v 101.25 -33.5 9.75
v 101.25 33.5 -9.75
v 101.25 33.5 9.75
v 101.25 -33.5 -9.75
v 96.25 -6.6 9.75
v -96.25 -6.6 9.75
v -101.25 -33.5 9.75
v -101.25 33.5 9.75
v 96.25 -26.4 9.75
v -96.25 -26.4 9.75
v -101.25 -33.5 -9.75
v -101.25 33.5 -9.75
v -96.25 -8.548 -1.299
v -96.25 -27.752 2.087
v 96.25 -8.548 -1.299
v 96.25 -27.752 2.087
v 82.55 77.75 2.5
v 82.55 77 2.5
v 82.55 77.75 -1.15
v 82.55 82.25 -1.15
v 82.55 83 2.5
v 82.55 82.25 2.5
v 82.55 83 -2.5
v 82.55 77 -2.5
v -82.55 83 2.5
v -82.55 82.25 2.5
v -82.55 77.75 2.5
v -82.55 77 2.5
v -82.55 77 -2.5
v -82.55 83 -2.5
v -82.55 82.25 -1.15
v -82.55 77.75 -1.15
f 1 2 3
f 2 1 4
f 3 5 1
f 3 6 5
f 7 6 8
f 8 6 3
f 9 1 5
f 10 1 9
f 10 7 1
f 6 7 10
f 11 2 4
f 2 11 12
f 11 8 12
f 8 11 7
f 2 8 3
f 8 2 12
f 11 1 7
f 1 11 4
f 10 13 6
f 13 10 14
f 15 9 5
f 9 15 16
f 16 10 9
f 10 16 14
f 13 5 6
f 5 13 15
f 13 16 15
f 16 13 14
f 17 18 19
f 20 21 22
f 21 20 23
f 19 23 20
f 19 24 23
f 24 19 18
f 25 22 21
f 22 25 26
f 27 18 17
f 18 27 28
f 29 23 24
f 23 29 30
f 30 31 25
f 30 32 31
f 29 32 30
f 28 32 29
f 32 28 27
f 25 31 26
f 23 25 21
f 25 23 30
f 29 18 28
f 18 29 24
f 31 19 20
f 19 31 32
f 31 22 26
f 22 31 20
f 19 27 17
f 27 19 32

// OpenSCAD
// file: myTools.scad
module tube (r = 0, d = 0, l = 0, 
            thick = 0, 
            bCentered = true, 
            taper_pct = 0, 
            circlip = false) // r=radius d=dia l=length 
{
    assert( r != 0 || d != 0, "specify one of radius or diameter");
    assert( l != 0 , "tube: need length 'l' to be non zero");
    assert( thick != 0, "wall thickness cannot be zero");

    punch = $preview ? .2 : 0; // stop funny view artifact

    dia = r ? r * 2 : d;

    od = ((thick > 0) ? dia + thick * 2 : dia);
    id = (thick > 0) ? dia             : dia  + thick *2; 

    
    
    if (thick > 0)
        echo ("tube\tMIN id = ", id, "od = ", od, "wall = ", thick, "center= ", bCentered);
    else
        echo ("tube\tMAX od = ", od, "id = ", id, "wall = ", thick, "center= ", bCentered);

    echo ("tube\tHeigth = ", l);
        
    if (taper_pct != 0)
    {
        echo ("tube\t*** OD expanded by ", taper_pct, "%, : bottom od = ", od * (1. +taper_pct/100), "top od = ", od);
    }
    
    assert(dia || dia < 0, "tube : missing r or d ");
    
    // if taper_pct specified, the base will always be closest to 0,0,0
    translate([ 0, 0, taper_pct == 0 ? 0: bCentered ? l/2:l  ])
    rotate([0, taper_pct == 0 ? 0 : 180, 0 ])

    difference()
    {
        // make a reese's cup
        {
            color("YELLOW", .3)
            linear_extrude(height= l, scale = 1 + taper_pct/100)
                difference()
                {
                    circle(d = od);
                    circle(d = .5);
                }
        }
    
     // hollow out reessed cup
     color("GREEN")
     translate([0, 0, -punch/2])
     linear_extrude(height= l+ punch*2, $fn=100)
     {
        circle(d = id);
        if (circlip) #square([1 + punch, od ]);
     }
    
    }
}
//==============================================================================
        
module abox (dims, 
            thick = 0, 
            bCentered = true, 
            round_out = 0, 
            round_in = 0, 
            bSolid = false,
            bHollow = false,
            elevator = 0)   // move bottom up by X
{
    punch = $preview ? .1 : 0; // stop funny view artifact
    
    assert(thick != 0, "Thick must be specified. +=outside dim, -= inside dims");
    assert(dims.z > thick, "wall thickness too large for depth of box");

    wall2 = abs(thick) * 2; // 2 walls in each direction
    wall = wall2 / 2;
    
    // box either grows inward (thick < 0) or outward (thick > 0)  from dims
    fat = dims + [ wall2, wall2, wall];
    thin = dims - [ wall2, wall2, wall];
    
    offset = (thick > 0 && bCentered == false) ? wall : 0;
    
    //echo ("abox : adjusting x,y,z by ", offset, " to move origin from  center to 0,0,0");
    translate( [ bCentered ? 0 : dims.x /2 + offset, bCentered ? 0 : dims.y /2 + offset, bCentered ? 0 : dims.z /2 + offset/2]) 
    {
        if (thick > 0)
        {   
            // wall grows outwards from users dim
            echo ("making a box, MAX INSIDE dim = ", dims);
            echo ("   wall=", thick, " mm");
            echo ("   calc outside = ", fat, " mm");
        }
        else
        {
            // wall grows inward from users dime
            echo ("making a box, MAX OUTSIDE dim = ", dims);
            echo ("    wall=", thick, "mm");
            echo ("    calc inside = ", thin, " mm");
        }
        echo (" ");
        
        // linear extrude alway works in the positive x/y plane an goes upward.
        // after calc, re-center about 0,0,0 where a bCentered cube would be
        
        translate([ 0, 0, thick > 0  ? -fat.z/2 : -dims.z/2 ])
        difference()
        {
            echo ("round_out = ", round_out);

            // MAKE SOLID BOX --------------------------------------
            router_outside = round_out ? round_out : 0;
            x = thick > 0  ? fat.x - router_outside : dims.x - router_outside;
            y = thick > 0  ? fat.y - router_outside : dims.y - router_outside;


            // MAKE PUCHNED INSIDE
            // using 'offset' it will add r on all dimensions, then round., 
            // so now you have fatter perimeter than you started with :(
            //  but at least the corners are round.
            
            // Compensate by shrinking dimension by r, 
            // and then by calling offset, offset will then add it back

            //color("YELLOW", .2)

            // ready height 
            linear_extrude(thick > 0  ? fat.z : dims.z)
            if (round_out)
            {
                offset( r= round_out, $fn=30)
                square( [x - router_outside, y - router_outside], true);
            }
            else
            {
                // no rounding on outside dims.
                square( [x, y], true);
            }
            // time to punch out the inside if requested.
            if (bSolid == false)
            {
                hollow_offset = bHollow ? fat.z/2 + .2  : dims.z/2 +.2;
                // punching out inside. its either dims or thin.
                router_inside = round_in;
                echo ("round_in = ", router_inside);
                xi = thick > 0  ? dims.x  : thin.x;
                yi = thick > 0  ? dims.y : thin.y ;

                color("GREEN")

                // move 'punch' up if you need a bottom else zero (hollowed out)

                translate([ 0,0, bHollow ? -.1 : wall + elevator]) 
                linear_extrude(thick > 0  ? fat.z - wall  + hollow_offset : dims.z - wall + hollow_offset)
                //#linear_extrude(fat.z - wall  + hollow_offset)
                
                if (round_in) 
                {
                    offset( r= round_in, $fn=30)
                    square( [ xi - round_in*2, yi - round_in*2], true);
                }
                else
                    square( [ xi, yi], true);
            }
        }
    }
 }
//-----------------------------------------------------
module abox_punch (dims, 
            thick = 0, 
            bCentered = true, 
            round_out = 0, 
            round_in = 0, 
            bSolid = false,
            bHollow = false,
            elevator = 0)   // move bottom up by X
{
    // move bottom down by wall thickness to blow out bottom
    abox(dims, thick, bCentered,
         round_out, round_in, bSolid = false, 
         bHollow=true, elevator = -thick);
}



// 50x25x10 box walls grow inward (-2). on center origin midpoint
// rounded outside (default), sharp corner inside(default), bCentered about 0,0,0
//color("GREEN", .9)
//abox([50,25, 10], -2, true); 


// 50x25x10 box walls grow outward (+2). on center origin midpoint
// sharp outside corners, rounded inside corners. Sit on x,y plane
color("BLUE", .9)
abox([50,20, 10], +2, round_in=2, bCentered = false);  // 50x25x10 box inside dim origin has 0,0


// 50x25x10 box walls grow inward (-2). on center origin midpoint
// sharp corners inside and out. sits on x,y plane
color("GREY", .9)//
translate([ 55, 0, 0])      
abox([50,20, 10], +2, round_out=3, false);

color("PINK", .9)//
translate([ 55 * 2, 0, 0])      
abox_punch([50,20, 10], +2, round_out=3, false);

color("GREEN", .9)//
translate([ 55 * 3, 0, 0])      
abox_punch([50,20, 10], +2, round_in=2, false);


color("CYAN", .9)//
translate([ 55 * 4, 0, 0])      
abox_punch([50,20, 10], +2, round_in=2, round_out=2, false);


/*
color("GREEN", .9)//
translate([ 140, 10, -10])      
abox([86.66, 56.865, 5], 3, bHollow = true, bCentered = false); 
*/

/*
// 50x25x10 box walls grow inward (-2). on center origin midpoint
// round corners outside and SOLID
color("BLUE", .9)//
translate([ 55, 0, 0])      
abox([50,25, 10], +2, round_out=2, round_in=0, false, bSolid = true); // 50x25x10 box outside dim origin is 0,0
*/

//translate ([-30,-30, 0])
{
/*
    // tube outer dia  20, inner dia = (20 - 8)
    color("PINK")
    tube (d = 20, l = 20, thick = -8, bCentered = false);

    // tube, inner dia = (2* 10), outer dia = ((2*10) + 2) 
    color("PURPLE", .3)
    tube (r = 10, l = 20, thick = +2, bCentered= true);
*/
/*
    tube (d = 60, l = 20, thick = -6, bCentered = false);

    translate([0, 0, 50])
    tube (d = 60, l = 20, thick = -6, bCentered = false, taper_pct = 20, circlip = true);
    //color("GREEN")
    //tube (d = 20, l = 20, thick = -2, bCentered = false, taper = 10, circlip = true);
*/

}
// main file
use <myTools.scad>
// HDMI DISPLAY HOLDER
$fn=100;

MM=25.4;
FUDGE=2;
ENG_VIEW=0 ; // -30

insert= [ 7.5 * MM + FUDGE, 17 + FUDGE, 17.5 + FUDGE ];

BOARDER=10;
stand = [ insert.x + BOARDER, insert.y * 3 + BOARDER, 17.5 + FUDGE ];

difference()
{
    color("GREEN", .4)
    cube(stand, true);
    
    translate([ENG_VIEW, -stand.y/2+ 17, insert.z/2])
    rotate([90 - 10, 0, 0])
    #cube(insert, true);
}


translate([0, 80, 0])
difference()
{
   cube( [6.5 * MM, 6, 5], true);
   translate ([0, 0, 1.1])
   cube( [6.5 * MM+2, 4.5, 4.5], true);
}
